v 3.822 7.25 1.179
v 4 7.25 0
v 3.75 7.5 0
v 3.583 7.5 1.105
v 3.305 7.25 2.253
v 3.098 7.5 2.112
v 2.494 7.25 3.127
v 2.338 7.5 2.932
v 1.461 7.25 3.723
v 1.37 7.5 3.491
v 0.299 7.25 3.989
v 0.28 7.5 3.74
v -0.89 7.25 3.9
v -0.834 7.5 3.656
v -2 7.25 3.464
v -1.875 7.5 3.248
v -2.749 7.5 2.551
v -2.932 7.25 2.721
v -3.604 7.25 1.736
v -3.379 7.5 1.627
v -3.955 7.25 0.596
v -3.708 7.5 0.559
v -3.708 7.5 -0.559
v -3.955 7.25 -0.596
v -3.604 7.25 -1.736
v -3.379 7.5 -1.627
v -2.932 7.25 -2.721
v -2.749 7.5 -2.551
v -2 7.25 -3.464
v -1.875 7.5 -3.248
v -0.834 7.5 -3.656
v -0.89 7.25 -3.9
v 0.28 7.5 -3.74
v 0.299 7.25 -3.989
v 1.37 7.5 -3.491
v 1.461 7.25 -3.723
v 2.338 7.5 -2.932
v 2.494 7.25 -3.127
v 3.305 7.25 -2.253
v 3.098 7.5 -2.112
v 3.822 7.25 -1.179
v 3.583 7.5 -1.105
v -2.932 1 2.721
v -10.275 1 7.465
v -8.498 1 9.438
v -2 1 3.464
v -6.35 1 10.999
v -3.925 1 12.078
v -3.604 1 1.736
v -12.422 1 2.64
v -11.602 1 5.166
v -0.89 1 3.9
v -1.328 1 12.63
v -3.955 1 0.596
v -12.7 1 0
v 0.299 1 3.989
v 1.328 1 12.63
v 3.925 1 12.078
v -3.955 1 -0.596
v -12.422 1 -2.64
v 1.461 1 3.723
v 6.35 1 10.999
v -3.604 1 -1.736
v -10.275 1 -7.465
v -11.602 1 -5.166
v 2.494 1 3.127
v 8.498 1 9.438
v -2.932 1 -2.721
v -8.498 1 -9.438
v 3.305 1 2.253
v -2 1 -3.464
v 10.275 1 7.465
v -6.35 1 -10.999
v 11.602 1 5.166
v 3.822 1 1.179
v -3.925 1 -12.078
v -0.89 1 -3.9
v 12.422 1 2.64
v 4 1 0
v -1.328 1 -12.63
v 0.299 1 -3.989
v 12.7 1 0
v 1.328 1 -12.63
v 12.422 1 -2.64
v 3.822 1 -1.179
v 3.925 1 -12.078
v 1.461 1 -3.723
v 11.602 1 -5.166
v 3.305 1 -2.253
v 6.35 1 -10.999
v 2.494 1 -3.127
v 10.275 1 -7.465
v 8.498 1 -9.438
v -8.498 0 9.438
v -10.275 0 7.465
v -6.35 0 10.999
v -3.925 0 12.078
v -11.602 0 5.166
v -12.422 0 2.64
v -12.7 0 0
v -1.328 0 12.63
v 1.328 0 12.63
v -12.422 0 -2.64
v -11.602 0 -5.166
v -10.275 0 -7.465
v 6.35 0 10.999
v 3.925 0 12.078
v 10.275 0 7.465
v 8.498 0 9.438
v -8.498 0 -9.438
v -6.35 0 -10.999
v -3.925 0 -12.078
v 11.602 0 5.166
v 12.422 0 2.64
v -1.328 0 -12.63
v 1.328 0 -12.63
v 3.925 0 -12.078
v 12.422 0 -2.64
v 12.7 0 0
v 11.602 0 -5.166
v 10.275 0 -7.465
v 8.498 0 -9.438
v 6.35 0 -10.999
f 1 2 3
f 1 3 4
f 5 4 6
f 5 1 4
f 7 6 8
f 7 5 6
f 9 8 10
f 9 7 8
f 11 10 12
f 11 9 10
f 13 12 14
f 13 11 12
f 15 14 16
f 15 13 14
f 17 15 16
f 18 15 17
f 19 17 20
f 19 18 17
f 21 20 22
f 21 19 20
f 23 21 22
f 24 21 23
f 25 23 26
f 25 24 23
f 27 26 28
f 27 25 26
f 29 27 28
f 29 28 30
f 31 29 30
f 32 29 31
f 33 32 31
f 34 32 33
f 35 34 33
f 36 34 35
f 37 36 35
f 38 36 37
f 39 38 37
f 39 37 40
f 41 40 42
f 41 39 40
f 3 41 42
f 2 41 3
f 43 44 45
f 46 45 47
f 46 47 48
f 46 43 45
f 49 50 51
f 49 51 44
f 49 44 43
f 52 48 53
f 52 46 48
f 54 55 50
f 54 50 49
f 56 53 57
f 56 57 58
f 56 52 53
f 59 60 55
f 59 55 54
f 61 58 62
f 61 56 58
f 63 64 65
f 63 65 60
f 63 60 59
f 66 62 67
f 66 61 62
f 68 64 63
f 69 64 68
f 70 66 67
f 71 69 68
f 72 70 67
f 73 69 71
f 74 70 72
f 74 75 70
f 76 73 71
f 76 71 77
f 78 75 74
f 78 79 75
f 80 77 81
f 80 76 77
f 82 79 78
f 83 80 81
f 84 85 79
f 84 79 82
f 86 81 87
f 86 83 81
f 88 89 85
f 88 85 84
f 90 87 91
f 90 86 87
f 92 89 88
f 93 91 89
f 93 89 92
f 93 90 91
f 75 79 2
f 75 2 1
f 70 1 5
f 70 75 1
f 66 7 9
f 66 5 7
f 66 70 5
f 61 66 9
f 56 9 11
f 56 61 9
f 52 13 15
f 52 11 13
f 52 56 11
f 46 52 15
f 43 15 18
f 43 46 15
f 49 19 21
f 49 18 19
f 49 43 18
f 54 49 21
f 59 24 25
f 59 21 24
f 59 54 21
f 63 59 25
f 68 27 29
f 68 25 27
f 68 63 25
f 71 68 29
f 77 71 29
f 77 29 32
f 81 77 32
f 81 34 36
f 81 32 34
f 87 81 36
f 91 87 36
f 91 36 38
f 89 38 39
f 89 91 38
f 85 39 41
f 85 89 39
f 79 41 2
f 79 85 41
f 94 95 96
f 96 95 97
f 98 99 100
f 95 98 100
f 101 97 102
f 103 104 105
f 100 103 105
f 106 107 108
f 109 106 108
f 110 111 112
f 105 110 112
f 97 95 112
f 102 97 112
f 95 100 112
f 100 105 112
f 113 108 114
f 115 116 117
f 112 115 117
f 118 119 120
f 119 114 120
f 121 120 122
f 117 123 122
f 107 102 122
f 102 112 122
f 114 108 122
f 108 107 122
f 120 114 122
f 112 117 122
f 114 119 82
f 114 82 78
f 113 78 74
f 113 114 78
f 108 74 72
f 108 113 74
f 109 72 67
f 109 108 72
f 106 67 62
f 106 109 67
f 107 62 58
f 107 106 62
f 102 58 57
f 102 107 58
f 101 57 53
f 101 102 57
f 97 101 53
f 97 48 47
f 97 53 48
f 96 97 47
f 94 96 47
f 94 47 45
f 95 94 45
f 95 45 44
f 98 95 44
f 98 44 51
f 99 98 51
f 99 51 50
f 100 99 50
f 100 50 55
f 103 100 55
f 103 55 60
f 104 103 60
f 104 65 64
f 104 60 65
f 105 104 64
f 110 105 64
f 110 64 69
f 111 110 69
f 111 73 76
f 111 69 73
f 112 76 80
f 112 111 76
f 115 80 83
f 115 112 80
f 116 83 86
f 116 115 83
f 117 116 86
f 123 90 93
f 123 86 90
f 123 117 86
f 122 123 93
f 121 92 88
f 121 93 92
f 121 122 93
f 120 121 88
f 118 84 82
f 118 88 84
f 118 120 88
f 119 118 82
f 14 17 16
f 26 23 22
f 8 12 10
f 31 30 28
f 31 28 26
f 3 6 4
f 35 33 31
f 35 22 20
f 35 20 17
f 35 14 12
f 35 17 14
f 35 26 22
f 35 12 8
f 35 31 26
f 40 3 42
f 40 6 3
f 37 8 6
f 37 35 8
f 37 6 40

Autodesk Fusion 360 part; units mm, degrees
sketch "Sketch1" plane through (0, 0, 0) normal (0, 1, 0) x (1, 0, 0)
  circle A0 centre (0, 0) radius 12.7
  circle A1 centre (0, 0) radius 4
  dimension "d1" = 25.4
  dimension "d4" = 8
extrude "Extrude1" add sketch "Sketch1" along normal blind 1
extrude "Extrude2" add sketch "Sketch1" along normal blind 7.5 contours A1
chamfer "Chamfer1" distance 0.25 angle 45 1 edges at (-3.7293, 7.5, 1.4465)
equation "d5 = 10.5 mm - 3 mm"
